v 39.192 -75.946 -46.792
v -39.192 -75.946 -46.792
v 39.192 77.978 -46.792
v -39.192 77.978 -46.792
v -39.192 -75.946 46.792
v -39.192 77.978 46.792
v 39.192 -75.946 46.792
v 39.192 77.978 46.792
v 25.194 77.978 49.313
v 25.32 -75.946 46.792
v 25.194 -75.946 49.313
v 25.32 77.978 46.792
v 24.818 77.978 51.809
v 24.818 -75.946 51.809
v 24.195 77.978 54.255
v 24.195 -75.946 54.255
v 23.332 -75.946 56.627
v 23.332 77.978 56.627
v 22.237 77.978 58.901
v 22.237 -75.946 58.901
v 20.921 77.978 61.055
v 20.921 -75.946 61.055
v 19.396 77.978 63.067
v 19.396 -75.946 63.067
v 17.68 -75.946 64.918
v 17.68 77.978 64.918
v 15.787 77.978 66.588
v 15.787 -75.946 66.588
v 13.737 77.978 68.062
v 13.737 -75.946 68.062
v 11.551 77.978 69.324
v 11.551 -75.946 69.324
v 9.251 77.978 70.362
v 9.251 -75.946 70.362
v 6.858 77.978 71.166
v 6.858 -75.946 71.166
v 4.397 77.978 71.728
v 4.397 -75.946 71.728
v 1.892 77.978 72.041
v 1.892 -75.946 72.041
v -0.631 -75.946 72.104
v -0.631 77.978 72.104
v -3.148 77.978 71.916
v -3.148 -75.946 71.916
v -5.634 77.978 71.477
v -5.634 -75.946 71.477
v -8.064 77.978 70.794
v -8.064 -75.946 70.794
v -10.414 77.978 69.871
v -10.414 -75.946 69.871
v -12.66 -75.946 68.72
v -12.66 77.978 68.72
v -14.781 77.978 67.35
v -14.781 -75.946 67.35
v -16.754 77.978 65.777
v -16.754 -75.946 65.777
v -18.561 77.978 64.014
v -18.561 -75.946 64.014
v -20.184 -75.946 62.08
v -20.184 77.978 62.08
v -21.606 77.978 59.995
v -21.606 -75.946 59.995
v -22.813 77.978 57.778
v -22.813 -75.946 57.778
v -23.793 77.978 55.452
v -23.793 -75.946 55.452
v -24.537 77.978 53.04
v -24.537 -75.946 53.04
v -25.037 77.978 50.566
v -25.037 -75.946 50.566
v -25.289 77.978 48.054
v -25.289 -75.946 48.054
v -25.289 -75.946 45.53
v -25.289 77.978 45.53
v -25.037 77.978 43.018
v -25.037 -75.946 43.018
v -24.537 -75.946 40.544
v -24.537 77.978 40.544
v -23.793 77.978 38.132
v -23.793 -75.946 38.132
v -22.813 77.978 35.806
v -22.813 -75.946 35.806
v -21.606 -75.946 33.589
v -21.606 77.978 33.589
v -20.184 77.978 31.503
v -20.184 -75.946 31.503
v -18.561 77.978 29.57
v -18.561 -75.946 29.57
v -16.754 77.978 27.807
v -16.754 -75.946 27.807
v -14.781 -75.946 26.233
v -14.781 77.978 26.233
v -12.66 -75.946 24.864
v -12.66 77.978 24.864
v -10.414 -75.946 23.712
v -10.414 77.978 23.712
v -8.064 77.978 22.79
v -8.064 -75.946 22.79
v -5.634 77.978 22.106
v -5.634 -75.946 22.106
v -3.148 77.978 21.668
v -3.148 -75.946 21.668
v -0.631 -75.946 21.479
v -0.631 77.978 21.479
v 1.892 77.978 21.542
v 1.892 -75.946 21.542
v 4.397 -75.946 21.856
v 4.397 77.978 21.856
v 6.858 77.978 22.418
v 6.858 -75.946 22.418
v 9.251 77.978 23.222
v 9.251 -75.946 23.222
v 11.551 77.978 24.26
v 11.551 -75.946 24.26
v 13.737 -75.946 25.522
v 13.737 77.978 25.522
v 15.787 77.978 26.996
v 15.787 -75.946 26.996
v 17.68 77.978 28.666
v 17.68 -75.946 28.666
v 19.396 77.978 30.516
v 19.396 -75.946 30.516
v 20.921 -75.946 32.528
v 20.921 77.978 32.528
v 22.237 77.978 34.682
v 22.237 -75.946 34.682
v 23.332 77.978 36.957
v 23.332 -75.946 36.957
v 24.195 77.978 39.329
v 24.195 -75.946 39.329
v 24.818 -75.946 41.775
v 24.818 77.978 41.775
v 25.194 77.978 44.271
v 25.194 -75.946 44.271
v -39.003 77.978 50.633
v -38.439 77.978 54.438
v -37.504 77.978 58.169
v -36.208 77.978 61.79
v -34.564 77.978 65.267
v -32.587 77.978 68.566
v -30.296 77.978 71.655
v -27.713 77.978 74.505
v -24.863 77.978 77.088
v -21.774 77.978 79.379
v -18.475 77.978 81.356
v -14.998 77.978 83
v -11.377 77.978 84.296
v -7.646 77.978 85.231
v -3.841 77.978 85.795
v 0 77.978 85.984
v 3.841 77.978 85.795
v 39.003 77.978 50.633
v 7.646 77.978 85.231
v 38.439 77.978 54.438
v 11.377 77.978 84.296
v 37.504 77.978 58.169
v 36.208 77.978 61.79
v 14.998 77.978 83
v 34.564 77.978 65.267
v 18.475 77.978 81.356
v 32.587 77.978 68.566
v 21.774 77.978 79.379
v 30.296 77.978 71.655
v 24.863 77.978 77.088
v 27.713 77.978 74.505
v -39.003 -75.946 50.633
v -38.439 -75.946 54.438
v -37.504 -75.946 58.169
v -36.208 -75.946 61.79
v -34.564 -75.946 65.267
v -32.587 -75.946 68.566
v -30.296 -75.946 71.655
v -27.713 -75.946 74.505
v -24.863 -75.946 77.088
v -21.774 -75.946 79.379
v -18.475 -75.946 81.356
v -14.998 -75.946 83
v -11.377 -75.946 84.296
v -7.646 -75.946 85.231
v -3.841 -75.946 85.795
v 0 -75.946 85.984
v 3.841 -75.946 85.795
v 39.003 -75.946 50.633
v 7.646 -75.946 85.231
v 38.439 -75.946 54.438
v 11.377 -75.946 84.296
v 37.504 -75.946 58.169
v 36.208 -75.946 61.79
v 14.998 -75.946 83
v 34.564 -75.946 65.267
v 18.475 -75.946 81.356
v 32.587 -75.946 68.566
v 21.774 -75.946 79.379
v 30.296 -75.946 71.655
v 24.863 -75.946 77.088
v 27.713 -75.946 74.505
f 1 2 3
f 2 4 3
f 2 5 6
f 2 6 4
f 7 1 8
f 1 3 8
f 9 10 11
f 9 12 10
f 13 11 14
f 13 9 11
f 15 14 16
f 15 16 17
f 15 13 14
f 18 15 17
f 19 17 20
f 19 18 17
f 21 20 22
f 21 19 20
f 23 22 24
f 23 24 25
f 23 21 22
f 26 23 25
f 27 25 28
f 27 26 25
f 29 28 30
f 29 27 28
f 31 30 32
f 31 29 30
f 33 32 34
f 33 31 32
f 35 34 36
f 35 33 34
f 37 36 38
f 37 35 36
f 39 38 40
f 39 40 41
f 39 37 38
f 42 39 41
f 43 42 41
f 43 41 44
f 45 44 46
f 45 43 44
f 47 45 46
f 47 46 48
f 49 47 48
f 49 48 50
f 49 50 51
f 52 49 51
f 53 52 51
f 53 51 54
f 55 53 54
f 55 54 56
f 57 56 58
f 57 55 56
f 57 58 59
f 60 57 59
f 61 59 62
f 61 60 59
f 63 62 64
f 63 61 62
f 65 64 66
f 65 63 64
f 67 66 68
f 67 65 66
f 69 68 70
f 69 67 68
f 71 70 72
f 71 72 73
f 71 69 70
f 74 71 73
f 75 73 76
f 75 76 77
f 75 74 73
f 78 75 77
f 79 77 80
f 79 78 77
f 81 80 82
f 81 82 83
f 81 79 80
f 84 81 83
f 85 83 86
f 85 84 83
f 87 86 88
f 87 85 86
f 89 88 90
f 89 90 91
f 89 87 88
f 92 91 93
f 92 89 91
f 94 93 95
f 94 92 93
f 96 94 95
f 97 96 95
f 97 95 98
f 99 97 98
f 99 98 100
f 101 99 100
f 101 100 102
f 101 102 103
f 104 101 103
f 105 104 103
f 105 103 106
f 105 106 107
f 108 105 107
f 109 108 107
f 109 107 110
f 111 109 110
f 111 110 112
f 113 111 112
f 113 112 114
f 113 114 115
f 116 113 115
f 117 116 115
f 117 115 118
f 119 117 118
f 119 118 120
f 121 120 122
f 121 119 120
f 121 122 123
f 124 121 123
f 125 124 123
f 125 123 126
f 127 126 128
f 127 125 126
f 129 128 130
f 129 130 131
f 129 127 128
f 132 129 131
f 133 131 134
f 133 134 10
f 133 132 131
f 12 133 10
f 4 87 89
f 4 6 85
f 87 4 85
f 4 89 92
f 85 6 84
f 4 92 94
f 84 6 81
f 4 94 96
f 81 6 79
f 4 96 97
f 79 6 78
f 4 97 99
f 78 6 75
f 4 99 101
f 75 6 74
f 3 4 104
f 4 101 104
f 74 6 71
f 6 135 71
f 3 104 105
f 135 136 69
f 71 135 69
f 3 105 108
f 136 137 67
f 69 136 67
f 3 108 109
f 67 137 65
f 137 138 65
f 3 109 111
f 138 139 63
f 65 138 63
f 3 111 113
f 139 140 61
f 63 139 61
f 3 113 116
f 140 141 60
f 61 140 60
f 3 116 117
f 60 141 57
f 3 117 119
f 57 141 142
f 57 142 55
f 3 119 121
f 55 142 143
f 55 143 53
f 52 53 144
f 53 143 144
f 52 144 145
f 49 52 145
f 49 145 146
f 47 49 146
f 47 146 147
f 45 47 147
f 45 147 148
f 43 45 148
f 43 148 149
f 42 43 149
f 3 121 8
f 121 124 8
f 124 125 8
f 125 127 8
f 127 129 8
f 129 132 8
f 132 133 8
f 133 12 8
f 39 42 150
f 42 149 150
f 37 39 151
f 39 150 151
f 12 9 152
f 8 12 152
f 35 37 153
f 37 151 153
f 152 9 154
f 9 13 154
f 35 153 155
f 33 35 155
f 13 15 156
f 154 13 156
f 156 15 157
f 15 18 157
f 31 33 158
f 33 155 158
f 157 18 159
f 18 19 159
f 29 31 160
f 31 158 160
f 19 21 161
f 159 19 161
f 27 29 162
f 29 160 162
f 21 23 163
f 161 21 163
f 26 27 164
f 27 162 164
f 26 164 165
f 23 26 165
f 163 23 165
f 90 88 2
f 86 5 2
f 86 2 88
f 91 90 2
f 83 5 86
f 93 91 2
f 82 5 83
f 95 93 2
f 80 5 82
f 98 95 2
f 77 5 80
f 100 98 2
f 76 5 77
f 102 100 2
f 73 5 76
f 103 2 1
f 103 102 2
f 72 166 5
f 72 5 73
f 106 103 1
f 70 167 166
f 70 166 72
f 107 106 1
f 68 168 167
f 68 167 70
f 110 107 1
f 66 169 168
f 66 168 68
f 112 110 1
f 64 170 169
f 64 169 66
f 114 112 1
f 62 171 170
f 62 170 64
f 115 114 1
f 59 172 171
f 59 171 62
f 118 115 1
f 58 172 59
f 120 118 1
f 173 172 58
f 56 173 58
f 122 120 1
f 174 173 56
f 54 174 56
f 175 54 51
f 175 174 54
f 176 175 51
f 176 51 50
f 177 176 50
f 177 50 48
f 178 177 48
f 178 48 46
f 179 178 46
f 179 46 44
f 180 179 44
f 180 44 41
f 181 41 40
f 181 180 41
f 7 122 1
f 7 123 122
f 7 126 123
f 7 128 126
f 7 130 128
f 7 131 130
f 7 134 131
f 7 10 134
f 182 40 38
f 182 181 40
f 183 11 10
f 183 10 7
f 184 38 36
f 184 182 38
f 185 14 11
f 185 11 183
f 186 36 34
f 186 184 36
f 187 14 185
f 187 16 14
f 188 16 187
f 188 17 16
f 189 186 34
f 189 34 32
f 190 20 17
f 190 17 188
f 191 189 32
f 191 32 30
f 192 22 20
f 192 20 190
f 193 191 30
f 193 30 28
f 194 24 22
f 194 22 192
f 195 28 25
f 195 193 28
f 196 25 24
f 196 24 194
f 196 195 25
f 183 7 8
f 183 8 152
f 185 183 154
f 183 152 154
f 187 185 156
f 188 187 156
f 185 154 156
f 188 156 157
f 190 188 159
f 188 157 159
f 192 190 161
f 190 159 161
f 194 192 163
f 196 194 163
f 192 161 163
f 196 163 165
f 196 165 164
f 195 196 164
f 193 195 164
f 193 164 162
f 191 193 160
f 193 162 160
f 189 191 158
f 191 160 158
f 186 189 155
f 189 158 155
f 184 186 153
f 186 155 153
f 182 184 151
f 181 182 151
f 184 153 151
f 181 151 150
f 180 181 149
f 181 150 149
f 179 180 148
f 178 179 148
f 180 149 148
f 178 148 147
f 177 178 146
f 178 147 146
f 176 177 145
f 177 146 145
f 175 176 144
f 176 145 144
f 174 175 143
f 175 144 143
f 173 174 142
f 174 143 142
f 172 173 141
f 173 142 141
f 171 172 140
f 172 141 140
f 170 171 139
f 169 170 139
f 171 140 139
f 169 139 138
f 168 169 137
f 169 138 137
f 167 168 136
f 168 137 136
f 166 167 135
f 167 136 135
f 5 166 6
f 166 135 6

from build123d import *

# Parameters (mm, degrees)
F0_R      = 25.320305
F1_DEPTH  = 77.978
F1_FACE_R = 25.320305
F2_DEPTH  = 75.946


with BuildPart() as f1:
    # F0 (on Front) → F1 (new body)
    with BuildSketch(Plane.XZ):
        with BuildLine():
            Line((-39.191756, 46.791889), (-39.191756, -46.791889))
            Line((-39.191756, -46.791889), (39.191756, -46.791889))
            Line((39.191756, -46.791889), (39.191756, 46.791889))
            ThreePointArc((39.191756, 46.791889), (0, 85.983645), (-39.191756, 46.791889))
        make_face()
        with Locations((0, 46.791889)):
            Circle(F0_R, mode=Mode.SUBTRACT)
    extrude(amount=-F1_DEPTH)

    # F1_face (on face) → F2 (join)
    with BuildSketch(Plane(origin=(0, 0, 7.600639), x_dir=(1, 0, 0), z_dir=(0, -1, 0))):
        with BuildLine():
            Line((-39.191756, 39.19125), (-39.191756, -54.392528))
            Line((-39.191756, -54.392528), (39.191756, -54.392528))
            Line((39.191756, -54.392528), (39.191756, 39.19125))
            ThreePointArc((39.191756, 39.19125), (0, 78.383006), (-39.191756, 39.19125))
        make_face()
        with Locations((0, 39.19125)):
            Circle(F1_FACE_R, mode=Mode.SUBTRACT)
    extrude(amount=F2_DEPTH)


solid = f1.part
